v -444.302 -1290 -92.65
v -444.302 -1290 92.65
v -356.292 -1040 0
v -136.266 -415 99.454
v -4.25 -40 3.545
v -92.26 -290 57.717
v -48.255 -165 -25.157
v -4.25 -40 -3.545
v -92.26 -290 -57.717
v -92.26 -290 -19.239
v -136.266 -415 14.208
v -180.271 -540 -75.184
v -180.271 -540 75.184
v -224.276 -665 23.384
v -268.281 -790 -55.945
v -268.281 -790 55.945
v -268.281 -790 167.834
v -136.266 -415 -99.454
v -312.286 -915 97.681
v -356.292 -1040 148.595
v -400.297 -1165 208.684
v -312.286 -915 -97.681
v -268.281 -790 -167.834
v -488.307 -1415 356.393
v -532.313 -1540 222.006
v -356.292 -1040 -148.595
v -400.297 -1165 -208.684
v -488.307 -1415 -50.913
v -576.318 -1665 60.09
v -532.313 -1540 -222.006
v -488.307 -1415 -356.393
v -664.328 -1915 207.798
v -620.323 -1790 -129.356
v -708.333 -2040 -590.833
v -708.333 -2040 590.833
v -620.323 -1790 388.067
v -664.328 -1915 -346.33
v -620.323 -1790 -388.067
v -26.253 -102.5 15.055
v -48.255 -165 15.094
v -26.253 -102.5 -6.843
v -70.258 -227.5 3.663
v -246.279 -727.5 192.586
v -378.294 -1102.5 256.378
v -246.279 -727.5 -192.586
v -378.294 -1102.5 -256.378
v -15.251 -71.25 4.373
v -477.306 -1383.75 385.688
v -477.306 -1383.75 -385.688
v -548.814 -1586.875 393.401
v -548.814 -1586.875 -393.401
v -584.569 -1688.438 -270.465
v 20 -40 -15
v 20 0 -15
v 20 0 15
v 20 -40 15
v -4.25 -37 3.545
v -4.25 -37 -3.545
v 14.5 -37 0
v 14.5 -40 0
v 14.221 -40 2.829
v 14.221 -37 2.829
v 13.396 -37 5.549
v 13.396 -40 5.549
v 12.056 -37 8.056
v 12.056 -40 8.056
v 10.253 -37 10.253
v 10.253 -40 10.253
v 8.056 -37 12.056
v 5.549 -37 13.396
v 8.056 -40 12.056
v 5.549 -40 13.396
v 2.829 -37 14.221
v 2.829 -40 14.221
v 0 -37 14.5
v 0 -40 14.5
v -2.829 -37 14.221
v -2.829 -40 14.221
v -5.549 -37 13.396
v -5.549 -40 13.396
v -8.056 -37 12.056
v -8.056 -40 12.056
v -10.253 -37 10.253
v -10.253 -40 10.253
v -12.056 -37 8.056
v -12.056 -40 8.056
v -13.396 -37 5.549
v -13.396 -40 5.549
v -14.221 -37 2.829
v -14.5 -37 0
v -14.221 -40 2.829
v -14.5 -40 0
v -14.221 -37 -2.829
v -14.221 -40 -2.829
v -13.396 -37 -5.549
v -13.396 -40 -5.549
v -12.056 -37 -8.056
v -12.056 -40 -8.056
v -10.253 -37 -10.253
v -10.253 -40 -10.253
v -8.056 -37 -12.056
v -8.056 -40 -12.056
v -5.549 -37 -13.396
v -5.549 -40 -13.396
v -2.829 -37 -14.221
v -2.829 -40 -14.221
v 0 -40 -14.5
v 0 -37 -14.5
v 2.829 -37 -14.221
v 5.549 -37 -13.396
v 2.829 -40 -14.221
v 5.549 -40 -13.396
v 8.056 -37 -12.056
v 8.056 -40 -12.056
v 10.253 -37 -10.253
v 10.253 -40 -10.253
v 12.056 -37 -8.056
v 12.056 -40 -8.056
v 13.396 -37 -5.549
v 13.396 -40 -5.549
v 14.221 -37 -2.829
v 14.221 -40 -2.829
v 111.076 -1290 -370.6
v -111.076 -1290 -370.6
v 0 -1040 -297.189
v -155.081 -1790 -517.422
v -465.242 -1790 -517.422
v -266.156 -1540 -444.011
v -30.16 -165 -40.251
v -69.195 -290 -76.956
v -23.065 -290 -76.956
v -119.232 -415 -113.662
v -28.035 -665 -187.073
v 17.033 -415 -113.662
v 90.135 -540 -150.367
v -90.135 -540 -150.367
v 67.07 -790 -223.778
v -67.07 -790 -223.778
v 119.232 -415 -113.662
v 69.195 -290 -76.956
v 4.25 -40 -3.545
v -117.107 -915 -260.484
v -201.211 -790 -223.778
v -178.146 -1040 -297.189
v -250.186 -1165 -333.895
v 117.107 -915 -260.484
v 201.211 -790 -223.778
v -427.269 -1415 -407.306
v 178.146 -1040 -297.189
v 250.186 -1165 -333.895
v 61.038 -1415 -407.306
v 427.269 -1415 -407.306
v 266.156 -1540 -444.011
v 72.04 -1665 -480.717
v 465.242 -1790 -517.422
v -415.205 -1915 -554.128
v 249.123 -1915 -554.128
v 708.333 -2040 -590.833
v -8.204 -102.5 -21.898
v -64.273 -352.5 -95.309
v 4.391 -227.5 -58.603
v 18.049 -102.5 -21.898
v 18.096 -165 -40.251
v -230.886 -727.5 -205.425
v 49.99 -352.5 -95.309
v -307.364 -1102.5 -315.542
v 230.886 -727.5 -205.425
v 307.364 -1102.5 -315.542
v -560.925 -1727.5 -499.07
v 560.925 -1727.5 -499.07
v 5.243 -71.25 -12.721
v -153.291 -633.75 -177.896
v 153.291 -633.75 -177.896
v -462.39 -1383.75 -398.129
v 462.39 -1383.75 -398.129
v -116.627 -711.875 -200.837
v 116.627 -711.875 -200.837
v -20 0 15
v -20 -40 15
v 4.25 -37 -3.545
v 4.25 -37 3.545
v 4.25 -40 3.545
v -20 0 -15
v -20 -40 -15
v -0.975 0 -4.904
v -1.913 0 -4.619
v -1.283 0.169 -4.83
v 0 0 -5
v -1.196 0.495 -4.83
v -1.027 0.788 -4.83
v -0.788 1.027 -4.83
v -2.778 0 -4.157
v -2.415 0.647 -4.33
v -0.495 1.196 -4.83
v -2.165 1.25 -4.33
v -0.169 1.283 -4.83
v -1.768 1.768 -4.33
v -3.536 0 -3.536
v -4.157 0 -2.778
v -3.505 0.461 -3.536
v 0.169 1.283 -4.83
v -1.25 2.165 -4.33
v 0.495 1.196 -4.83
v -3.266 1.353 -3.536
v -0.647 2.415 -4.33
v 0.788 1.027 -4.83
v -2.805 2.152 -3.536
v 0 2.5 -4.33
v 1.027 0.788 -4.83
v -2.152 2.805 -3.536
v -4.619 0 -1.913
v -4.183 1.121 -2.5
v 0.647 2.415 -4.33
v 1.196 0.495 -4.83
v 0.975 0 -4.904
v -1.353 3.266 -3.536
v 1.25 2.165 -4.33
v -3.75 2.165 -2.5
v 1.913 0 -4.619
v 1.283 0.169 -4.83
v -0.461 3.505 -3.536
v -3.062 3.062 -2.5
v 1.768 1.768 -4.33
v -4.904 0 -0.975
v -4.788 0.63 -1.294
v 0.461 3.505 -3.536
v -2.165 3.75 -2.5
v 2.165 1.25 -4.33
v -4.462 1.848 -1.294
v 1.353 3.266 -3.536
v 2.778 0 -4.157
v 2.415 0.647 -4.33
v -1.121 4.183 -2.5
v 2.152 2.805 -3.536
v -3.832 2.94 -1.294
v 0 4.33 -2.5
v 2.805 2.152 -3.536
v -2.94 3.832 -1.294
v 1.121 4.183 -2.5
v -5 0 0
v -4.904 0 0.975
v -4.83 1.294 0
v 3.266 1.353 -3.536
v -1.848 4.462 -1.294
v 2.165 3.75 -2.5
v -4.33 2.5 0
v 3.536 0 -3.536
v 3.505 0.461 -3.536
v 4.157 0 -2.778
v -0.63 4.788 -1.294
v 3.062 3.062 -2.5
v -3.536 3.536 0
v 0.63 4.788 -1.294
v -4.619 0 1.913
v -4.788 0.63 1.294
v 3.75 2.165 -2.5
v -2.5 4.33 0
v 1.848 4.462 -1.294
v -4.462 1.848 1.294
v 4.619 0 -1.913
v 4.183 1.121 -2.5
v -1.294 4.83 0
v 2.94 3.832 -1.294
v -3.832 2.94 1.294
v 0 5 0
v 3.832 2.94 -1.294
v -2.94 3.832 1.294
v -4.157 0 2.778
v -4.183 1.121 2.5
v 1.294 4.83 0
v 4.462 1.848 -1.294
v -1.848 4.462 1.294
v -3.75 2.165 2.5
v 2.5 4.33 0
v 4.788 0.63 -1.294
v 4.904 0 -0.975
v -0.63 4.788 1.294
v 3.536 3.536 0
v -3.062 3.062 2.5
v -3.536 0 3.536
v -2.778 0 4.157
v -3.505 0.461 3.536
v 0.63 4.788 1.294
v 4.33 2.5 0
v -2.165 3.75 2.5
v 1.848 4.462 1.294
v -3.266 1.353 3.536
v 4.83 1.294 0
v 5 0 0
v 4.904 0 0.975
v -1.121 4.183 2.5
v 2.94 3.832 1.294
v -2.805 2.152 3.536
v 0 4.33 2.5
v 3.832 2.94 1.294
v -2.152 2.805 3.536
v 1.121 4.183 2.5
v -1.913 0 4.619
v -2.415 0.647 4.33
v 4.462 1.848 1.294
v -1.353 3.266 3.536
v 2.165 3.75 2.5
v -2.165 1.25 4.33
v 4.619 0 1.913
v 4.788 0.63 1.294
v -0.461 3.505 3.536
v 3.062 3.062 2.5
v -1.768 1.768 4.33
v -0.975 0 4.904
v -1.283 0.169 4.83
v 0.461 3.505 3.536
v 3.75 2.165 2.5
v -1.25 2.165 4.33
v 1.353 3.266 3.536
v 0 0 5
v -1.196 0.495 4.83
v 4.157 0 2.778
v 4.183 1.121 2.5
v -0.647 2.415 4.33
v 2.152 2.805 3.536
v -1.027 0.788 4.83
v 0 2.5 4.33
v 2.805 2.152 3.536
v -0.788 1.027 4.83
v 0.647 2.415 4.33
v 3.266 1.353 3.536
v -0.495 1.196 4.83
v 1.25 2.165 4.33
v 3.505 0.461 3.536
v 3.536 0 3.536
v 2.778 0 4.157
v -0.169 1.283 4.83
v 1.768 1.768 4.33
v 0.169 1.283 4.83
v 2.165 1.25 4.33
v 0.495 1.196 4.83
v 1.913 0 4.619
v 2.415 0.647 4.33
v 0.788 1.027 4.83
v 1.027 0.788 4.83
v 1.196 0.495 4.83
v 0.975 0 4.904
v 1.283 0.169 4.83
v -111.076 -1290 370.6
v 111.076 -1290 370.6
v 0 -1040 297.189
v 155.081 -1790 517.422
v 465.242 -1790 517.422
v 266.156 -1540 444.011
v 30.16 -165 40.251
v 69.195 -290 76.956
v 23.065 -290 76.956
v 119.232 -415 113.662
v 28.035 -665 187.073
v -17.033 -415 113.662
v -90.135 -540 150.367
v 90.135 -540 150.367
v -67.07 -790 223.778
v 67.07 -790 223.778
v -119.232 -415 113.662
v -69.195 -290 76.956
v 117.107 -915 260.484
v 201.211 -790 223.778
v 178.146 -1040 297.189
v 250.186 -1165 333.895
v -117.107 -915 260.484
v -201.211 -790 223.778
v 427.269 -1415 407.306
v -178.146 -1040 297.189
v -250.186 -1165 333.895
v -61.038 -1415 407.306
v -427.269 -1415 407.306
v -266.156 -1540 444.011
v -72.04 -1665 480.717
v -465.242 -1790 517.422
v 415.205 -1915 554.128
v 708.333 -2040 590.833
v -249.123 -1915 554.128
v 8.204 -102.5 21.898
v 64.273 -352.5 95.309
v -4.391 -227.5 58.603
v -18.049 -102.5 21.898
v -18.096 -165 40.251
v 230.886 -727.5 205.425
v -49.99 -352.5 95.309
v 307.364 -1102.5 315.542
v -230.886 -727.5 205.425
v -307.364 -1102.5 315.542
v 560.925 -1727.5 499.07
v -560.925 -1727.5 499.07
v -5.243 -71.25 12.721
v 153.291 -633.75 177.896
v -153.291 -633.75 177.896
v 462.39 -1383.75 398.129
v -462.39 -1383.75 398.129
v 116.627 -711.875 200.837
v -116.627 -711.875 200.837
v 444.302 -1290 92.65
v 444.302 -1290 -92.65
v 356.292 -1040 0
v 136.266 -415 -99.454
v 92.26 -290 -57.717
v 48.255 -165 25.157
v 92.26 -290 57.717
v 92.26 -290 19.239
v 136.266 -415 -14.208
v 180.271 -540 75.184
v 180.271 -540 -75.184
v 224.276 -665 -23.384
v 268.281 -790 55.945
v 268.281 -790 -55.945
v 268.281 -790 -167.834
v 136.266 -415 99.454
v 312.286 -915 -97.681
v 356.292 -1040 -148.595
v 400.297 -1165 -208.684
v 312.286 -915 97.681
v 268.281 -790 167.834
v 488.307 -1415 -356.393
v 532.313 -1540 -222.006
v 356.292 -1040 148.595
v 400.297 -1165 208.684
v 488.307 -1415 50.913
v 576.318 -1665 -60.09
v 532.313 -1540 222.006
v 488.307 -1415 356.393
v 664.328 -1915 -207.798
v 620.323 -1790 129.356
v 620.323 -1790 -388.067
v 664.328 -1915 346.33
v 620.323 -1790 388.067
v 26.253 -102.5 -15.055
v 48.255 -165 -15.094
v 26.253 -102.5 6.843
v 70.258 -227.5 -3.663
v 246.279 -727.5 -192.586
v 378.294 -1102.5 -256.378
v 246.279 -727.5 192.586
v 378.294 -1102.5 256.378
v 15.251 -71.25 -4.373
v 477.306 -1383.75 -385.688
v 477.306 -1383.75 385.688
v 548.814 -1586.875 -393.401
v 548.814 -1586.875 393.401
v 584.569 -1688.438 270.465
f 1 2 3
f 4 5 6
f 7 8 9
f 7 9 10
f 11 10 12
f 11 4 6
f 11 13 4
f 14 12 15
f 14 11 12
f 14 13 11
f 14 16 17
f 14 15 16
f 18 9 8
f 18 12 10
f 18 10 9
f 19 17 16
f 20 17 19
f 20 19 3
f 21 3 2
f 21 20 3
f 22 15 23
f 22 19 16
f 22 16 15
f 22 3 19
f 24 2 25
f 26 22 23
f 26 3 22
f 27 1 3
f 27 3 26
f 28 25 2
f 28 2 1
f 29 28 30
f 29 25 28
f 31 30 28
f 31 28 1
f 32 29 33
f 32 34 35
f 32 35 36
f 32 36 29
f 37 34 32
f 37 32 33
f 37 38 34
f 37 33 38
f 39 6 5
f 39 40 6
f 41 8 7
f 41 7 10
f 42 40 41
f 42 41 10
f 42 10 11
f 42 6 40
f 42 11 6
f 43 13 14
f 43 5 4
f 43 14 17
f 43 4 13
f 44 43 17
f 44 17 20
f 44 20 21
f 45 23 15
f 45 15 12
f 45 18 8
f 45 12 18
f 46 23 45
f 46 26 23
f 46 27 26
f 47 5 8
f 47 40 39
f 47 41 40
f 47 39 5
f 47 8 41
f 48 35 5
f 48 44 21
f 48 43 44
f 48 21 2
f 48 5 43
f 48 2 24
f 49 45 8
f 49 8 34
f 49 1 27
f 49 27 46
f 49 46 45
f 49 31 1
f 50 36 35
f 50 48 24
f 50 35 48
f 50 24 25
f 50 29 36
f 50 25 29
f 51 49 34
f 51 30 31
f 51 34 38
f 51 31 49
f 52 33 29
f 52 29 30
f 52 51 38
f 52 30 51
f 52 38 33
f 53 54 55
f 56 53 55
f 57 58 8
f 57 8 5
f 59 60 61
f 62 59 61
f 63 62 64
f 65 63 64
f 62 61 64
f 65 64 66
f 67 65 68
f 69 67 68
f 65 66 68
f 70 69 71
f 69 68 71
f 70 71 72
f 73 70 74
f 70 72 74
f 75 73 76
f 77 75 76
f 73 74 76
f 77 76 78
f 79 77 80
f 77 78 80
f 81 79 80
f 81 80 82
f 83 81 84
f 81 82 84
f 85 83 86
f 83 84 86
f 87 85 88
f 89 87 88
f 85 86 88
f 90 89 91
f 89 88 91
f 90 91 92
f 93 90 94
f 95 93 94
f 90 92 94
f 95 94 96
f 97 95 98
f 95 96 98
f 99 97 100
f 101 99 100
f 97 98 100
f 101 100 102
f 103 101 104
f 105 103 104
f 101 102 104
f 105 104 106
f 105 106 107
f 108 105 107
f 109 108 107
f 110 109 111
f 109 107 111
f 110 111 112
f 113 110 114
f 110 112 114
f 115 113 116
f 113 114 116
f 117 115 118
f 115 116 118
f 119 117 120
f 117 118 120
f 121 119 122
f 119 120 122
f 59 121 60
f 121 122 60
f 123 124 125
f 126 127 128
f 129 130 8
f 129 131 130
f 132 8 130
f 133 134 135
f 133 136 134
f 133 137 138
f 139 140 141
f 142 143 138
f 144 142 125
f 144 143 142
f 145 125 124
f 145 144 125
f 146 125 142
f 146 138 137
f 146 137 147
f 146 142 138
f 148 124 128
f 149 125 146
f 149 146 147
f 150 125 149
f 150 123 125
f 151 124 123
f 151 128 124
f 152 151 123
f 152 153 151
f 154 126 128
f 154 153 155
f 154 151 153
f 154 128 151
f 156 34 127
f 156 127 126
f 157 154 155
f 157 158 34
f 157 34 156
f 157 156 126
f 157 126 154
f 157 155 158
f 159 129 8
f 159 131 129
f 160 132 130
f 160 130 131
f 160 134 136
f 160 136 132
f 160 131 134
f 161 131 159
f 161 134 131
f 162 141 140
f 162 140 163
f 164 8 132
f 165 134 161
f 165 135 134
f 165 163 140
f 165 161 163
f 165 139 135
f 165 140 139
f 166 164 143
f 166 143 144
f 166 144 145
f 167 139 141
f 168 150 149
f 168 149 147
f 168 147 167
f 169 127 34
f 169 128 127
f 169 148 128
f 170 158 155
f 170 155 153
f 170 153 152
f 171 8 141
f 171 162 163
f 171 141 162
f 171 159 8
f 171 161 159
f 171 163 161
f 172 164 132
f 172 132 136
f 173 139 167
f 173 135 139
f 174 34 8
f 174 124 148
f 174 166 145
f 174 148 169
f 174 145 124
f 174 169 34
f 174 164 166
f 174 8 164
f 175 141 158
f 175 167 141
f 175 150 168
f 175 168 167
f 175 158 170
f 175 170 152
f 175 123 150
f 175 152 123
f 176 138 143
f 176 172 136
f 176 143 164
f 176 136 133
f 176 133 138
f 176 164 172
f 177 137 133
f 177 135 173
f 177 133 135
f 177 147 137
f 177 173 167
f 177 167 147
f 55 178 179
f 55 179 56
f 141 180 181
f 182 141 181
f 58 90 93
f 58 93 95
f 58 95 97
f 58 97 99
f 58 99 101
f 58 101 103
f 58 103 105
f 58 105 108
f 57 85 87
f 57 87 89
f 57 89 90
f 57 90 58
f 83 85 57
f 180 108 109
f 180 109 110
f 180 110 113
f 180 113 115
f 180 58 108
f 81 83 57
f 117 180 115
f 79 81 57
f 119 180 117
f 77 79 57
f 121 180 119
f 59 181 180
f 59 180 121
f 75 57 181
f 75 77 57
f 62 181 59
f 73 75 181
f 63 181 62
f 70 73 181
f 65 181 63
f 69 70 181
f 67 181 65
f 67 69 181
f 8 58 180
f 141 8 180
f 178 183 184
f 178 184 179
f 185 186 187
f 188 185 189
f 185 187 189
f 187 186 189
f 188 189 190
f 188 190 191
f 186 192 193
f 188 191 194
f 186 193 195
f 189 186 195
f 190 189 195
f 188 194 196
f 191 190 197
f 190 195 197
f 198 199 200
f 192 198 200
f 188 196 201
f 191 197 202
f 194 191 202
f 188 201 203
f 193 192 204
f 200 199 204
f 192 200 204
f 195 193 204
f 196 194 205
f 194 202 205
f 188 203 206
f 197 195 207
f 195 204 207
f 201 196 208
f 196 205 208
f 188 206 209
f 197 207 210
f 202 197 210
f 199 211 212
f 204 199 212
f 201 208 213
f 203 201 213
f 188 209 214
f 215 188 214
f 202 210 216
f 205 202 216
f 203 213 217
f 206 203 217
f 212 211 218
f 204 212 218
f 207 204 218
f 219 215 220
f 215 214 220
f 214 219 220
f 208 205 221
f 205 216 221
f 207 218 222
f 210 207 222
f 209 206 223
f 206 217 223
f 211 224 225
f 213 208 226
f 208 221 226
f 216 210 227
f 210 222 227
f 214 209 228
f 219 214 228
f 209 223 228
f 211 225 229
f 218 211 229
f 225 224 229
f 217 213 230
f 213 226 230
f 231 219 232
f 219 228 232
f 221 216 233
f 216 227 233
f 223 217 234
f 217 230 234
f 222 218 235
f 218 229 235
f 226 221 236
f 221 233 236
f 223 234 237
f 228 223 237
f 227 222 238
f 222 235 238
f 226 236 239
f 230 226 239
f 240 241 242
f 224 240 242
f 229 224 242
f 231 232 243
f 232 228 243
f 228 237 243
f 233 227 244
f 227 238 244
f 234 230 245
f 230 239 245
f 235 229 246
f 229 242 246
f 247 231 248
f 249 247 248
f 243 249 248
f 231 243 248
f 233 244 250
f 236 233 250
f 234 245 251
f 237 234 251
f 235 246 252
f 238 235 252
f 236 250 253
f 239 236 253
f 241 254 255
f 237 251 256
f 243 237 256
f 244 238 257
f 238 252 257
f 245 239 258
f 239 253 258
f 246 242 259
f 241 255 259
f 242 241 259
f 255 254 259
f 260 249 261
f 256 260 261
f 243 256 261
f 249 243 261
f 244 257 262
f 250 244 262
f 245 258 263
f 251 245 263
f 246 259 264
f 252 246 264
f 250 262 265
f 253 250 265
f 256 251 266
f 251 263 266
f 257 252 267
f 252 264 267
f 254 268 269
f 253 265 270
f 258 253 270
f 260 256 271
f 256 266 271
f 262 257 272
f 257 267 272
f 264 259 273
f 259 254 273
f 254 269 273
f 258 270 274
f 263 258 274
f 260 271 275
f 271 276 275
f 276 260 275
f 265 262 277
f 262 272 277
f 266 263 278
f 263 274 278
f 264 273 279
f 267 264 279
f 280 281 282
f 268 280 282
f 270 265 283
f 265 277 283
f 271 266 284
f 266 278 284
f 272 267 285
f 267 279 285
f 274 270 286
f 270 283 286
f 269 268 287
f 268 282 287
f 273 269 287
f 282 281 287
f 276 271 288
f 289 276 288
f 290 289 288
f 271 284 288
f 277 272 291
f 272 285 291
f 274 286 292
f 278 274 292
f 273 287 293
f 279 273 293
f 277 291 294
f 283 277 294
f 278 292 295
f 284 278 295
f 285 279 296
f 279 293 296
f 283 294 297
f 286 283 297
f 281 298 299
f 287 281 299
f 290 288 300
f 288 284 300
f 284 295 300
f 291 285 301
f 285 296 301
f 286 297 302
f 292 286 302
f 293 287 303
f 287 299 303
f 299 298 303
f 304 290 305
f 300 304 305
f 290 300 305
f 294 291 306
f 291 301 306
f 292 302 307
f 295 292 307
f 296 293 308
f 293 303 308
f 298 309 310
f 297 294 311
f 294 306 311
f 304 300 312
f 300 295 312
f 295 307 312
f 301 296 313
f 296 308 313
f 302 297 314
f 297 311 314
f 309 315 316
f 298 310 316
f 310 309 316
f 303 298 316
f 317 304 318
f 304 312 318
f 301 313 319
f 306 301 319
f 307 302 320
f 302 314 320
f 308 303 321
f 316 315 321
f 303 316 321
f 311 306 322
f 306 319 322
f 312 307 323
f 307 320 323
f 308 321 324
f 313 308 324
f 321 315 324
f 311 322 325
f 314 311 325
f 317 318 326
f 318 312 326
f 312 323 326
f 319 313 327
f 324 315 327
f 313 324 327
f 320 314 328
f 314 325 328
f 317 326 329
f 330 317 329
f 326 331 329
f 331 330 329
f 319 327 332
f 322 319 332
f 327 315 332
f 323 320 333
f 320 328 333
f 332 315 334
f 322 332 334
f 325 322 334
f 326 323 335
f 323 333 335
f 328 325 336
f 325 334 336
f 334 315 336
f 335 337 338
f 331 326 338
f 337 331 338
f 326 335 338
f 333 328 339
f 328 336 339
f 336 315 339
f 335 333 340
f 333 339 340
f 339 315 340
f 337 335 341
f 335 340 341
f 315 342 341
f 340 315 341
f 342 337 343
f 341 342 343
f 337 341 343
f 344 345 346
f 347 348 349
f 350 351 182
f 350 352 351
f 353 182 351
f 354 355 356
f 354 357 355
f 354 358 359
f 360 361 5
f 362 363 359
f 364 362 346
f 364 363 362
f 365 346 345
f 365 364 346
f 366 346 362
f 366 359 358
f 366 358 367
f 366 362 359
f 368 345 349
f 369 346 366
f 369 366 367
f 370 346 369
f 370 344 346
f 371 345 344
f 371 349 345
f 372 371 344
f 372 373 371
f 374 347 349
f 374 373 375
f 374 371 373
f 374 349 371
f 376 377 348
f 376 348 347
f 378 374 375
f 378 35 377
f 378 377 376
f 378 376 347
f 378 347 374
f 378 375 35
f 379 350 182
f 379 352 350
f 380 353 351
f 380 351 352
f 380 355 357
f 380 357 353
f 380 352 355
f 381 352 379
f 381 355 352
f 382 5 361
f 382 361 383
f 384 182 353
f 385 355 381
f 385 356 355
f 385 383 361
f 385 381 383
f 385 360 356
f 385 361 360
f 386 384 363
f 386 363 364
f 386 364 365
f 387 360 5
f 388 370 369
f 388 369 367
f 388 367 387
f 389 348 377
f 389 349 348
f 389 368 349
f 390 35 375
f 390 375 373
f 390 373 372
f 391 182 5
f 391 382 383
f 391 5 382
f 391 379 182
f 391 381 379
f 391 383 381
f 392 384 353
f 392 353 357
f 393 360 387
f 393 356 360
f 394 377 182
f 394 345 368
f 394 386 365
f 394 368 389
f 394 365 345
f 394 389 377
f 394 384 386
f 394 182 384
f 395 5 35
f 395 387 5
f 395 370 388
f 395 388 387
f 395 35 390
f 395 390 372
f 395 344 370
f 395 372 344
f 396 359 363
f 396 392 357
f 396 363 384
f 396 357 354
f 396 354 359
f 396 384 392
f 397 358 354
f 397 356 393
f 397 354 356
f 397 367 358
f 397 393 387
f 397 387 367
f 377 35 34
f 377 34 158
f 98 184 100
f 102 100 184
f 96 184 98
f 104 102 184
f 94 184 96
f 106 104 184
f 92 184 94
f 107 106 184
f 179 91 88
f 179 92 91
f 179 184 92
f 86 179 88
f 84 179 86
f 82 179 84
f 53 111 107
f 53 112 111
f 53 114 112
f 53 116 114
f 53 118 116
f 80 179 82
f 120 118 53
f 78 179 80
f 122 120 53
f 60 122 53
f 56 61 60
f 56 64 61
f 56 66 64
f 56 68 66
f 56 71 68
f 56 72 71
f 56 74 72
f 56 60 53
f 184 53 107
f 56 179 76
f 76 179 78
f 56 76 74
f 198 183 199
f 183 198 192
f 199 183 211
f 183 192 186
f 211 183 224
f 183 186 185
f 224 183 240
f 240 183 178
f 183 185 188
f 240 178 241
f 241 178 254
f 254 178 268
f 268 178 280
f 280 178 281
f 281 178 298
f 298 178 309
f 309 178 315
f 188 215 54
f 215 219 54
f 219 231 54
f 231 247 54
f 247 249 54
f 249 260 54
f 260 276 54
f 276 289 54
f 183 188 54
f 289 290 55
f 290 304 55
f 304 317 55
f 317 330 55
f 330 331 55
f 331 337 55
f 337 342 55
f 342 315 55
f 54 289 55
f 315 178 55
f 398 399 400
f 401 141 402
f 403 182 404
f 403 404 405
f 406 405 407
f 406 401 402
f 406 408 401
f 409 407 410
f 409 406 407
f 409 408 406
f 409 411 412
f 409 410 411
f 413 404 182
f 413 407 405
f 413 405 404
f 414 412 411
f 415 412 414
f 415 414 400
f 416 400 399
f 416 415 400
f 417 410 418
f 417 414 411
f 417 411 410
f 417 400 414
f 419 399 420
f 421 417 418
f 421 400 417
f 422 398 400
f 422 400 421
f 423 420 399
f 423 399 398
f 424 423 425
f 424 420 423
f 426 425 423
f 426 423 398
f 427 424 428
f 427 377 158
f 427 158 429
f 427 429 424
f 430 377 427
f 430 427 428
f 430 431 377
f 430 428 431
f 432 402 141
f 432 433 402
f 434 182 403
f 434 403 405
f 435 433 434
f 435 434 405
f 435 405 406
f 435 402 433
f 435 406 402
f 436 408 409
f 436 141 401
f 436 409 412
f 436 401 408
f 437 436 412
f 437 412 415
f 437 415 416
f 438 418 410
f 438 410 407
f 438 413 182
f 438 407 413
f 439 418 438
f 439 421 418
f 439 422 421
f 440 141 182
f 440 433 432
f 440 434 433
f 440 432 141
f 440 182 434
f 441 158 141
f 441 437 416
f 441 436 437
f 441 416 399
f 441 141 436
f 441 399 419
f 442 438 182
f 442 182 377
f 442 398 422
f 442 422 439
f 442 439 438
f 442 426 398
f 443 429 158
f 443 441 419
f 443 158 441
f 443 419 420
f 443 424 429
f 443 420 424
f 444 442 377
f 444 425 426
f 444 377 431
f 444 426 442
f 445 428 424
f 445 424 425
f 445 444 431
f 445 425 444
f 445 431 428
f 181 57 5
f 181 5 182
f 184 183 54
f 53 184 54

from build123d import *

# Parameters (mm, degrees)
F0_W      = 40
F0_H      = 30
F1_DEPTH  = 40
F3_R      = 14.5
F4_DEPTH  = 3
F5_W      = 8.5
F5_H      = 7.09
F6_DEPTH  = 3
F6_FACE_W = 8.5
F6_FACE_H = 7.09
F8_W      = 1416.6666666667
F8_H      = 1181.6666666667


with BuildPart() as f1:
    # F0 (on Front) → F1 (new body)
    with BuildSketch(Plane.XZ):
        Rectangle(F0_W, F0_H)
    extrude(amount=F1_DEPTH)

    # F3 (on face) → F4 (cut)
    with BuildSketch(Plane.XZ.offset(40)):
        Circle(F3_R)
    extrude(amount=-F4_DEPTH, mode=Mode.SUBTRACT)

    # F5 (on face) → F6 (join)
    with BuildSketch(Plane.XZ.offset(37)):
        Rectangle(F5_W, F5_H)
    extrude(amount=F6_DEPTH)

    # F6_face (on face) → F9 section 0
    with BuildSketch(Plane.XZ.offset(40)):
        Rectangle(F6_FACE_W, F6_FACE_H)
    # F8 (on offset) → F9 section 1
    with BuildSketch(Plane.XZ.offset(2040)):
        Rectangle(F8_W, F8_H)
    loft()

    # F10 (on face) → F11 (revolve)
    with BuildSketch(Plane.XZ):
        with BuildLine():
            ThreePointArc((0, -5), (5, 0), (0, 5))
            Line((0, 5), (0, -5))
        make_face()
    revolve(axis=Axis((0, 0, 0), (0, 0, -1)))


solid = f1.part
